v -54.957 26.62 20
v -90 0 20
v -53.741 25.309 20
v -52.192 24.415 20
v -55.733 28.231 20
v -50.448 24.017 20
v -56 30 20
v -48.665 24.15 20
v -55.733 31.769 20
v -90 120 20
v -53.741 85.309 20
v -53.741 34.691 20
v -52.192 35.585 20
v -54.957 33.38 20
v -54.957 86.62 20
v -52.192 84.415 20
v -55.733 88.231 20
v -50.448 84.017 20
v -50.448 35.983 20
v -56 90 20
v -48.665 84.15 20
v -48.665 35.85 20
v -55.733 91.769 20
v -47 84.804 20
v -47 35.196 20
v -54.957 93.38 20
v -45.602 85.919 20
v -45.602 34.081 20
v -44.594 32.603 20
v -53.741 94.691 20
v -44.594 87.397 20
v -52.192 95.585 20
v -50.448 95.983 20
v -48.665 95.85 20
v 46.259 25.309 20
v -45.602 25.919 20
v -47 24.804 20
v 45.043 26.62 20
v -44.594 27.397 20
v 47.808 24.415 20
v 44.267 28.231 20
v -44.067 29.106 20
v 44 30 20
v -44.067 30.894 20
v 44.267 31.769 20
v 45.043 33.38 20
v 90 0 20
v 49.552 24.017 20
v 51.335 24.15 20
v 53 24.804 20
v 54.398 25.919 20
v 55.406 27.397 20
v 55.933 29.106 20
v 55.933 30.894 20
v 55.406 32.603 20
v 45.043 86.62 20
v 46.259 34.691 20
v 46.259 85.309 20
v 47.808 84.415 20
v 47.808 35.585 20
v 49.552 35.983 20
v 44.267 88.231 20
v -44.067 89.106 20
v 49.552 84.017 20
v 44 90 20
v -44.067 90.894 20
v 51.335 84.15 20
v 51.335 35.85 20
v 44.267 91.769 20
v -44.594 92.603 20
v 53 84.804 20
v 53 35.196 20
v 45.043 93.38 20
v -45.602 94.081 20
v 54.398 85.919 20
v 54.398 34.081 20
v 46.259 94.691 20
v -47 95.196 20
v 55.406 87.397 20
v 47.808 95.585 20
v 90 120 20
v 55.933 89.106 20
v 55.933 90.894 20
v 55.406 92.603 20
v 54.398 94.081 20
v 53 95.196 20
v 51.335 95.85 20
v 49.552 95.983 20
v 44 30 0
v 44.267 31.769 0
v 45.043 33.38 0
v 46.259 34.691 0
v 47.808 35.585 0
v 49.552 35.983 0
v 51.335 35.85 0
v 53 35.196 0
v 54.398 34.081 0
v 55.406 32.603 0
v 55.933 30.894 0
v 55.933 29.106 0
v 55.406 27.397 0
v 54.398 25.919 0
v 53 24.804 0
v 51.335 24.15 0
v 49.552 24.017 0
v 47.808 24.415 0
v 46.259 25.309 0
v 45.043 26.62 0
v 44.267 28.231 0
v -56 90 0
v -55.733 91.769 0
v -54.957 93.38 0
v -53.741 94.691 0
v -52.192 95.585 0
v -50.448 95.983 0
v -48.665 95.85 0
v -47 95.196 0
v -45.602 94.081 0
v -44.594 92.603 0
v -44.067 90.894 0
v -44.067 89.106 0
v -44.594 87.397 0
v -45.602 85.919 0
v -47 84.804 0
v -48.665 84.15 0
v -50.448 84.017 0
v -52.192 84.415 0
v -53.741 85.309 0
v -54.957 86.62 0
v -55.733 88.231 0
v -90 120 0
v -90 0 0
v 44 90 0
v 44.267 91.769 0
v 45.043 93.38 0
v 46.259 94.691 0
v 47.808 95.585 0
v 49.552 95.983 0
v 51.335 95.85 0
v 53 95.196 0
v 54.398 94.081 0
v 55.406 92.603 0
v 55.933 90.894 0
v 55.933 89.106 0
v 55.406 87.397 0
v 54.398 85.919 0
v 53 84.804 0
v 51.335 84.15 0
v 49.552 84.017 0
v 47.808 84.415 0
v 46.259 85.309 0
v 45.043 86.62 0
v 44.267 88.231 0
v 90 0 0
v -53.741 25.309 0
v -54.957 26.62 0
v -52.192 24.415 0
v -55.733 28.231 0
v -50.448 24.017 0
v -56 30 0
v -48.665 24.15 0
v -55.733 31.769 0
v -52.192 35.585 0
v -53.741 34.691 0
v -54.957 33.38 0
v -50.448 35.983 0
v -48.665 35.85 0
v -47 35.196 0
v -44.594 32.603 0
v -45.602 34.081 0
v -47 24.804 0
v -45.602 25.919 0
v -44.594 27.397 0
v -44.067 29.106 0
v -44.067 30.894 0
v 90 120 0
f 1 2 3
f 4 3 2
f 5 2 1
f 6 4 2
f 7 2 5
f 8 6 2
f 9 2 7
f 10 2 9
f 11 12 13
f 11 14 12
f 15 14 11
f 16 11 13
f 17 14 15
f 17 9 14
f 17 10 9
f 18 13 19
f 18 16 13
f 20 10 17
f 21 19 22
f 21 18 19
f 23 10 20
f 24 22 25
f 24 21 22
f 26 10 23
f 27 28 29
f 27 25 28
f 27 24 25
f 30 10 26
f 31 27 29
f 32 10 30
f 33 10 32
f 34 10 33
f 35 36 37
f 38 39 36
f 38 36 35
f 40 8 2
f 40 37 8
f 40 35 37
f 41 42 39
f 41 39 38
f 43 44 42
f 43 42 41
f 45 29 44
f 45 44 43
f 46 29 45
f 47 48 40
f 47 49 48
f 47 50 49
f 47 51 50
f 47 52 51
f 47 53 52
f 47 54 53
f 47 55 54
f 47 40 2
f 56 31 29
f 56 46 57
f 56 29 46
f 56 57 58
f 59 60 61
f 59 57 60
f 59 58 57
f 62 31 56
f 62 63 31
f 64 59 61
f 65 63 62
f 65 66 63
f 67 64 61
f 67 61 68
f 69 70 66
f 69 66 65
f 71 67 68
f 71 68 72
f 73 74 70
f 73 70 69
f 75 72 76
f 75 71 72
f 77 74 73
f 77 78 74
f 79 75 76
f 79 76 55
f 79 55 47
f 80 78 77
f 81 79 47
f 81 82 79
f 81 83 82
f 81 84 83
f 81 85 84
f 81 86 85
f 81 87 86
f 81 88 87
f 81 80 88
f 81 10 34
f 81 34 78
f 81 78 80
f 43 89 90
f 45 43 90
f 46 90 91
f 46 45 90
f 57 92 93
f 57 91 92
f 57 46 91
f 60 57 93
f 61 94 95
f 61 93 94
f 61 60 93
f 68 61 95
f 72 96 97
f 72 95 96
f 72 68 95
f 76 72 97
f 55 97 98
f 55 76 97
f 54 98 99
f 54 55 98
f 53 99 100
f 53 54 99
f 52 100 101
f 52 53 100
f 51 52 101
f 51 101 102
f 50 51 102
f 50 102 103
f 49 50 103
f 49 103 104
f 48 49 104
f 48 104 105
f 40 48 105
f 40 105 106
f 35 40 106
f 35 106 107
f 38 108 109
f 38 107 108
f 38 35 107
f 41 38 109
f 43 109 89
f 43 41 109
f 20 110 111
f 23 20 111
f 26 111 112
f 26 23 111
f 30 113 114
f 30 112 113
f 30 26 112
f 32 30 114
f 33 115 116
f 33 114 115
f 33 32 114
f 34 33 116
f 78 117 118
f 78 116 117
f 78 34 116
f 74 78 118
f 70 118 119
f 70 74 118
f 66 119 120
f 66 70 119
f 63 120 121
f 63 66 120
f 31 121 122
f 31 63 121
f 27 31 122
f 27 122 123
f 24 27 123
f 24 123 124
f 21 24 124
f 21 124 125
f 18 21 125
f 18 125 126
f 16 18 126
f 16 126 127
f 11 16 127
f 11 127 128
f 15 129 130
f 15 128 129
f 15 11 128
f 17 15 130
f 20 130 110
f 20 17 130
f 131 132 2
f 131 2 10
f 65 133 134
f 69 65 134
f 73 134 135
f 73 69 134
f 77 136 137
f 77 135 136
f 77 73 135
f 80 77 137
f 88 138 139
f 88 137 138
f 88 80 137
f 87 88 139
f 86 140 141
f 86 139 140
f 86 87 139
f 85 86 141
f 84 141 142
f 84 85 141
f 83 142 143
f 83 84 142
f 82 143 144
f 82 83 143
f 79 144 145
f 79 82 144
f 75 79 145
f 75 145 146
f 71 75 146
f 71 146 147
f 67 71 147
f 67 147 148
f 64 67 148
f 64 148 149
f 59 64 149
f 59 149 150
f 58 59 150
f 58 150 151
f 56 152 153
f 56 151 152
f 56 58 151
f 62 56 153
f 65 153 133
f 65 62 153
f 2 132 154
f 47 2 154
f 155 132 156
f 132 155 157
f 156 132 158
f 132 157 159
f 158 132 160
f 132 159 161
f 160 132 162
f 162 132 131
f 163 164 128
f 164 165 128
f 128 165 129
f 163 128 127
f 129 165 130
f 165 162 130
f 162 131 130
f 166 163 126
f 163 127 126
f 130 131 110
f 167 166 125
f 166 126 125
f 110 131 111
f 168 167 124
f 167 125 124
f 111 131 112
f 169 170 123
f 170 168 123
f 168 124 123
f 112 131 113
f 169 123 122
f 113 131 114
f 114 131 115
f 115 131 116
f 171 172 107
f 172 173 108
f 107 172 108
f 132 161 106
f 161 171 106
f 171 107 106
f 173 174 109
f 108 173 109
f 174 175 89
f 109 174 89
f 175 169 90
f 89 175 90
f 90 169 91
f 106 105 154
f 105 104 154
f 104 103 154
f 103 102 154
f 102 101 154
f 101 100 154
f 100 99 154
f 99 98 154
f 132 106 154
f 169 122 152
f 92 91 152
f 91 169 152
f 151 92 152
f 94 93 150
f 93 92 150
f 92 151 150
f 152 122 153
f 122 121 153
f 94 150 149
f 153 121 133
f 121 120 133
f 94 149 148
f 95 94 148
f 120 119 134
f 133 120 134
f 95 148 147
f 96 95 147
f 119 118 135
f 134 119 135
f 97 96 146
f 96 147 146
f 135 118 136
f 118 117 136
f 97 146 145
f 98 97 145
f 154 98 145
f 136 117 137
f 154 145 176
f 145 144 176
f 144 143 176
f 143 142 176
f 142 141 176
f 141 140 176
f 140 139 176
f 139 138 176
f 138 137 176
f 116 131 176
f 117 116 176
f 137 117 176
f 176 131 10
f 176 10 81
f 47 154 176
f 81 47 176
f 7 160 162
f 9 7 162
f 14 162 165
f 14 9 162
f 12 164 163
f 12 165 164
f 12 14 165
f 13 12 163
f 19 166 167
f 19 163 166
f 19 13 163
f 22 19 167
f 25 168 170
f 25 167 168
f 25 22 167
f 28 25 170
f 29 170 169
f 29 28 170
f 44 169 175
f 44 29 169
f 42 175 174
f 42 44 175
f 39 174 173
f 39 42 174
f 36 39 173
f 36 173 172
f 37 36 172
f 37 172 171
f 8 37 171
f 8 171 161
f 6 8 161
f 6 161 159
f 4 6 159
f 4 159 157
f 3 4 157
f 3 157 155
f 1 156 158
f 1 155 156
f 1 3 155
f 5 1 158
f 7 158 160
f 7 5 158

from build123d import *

# Parameters (mm, degrees)
ESBO_O1_W                  = 180
ESBO_O1_H                  = 120
RESSALTO_EXTRUS_O1_DEPTH   = 20
CORTE_EXTRUS_O1_DEPTH      = 152.327459504
CORTE_EXTRUS_O1_DEPTH_BACK = 152.327459504
ESBO_O2_R                  = 6


with BuildPart() as part:
    # Esboço1 → Ressalto-extrusão1 (new body)
    with BuildSketch(Plane.XY):
        with Locations((0, 60)):
            Rectangle(ESBO_O1_W, ESBO_O1_H)
    extrude(amount=RESSALTO_EXTRUS_O1_DEPTH)

    # Esboço2 → Corte-extrusão1 (cut, two sides: drawn at the far end of the back side and taken through both)
    with BuildSketch(Plane(origin=(0, 0, 0), x_dir=(-1, 0, 0), z_dir=(0, 0, -1)).offset(-CORTE_EXTRUS_O1_DEPTH_BACK)):
        with Locations((-50, 90)):
            Circle(ESBO_O2_R)
        with Locations((-50, 30)):
            Circle(ESBO_O2_R)
        with Locations((50, 30)):
            Circle(ESBO_O2_R)
        with Locations((50, 90)):
            Circle(ESBO_O2_R)
    extrude(amount=CORTE_EXTRUS_O1_DEPTH + CORTE_EXTRUS_O1_DEPTH_BACK, mode=Mode.SUBTRACT)


solid = part.part
